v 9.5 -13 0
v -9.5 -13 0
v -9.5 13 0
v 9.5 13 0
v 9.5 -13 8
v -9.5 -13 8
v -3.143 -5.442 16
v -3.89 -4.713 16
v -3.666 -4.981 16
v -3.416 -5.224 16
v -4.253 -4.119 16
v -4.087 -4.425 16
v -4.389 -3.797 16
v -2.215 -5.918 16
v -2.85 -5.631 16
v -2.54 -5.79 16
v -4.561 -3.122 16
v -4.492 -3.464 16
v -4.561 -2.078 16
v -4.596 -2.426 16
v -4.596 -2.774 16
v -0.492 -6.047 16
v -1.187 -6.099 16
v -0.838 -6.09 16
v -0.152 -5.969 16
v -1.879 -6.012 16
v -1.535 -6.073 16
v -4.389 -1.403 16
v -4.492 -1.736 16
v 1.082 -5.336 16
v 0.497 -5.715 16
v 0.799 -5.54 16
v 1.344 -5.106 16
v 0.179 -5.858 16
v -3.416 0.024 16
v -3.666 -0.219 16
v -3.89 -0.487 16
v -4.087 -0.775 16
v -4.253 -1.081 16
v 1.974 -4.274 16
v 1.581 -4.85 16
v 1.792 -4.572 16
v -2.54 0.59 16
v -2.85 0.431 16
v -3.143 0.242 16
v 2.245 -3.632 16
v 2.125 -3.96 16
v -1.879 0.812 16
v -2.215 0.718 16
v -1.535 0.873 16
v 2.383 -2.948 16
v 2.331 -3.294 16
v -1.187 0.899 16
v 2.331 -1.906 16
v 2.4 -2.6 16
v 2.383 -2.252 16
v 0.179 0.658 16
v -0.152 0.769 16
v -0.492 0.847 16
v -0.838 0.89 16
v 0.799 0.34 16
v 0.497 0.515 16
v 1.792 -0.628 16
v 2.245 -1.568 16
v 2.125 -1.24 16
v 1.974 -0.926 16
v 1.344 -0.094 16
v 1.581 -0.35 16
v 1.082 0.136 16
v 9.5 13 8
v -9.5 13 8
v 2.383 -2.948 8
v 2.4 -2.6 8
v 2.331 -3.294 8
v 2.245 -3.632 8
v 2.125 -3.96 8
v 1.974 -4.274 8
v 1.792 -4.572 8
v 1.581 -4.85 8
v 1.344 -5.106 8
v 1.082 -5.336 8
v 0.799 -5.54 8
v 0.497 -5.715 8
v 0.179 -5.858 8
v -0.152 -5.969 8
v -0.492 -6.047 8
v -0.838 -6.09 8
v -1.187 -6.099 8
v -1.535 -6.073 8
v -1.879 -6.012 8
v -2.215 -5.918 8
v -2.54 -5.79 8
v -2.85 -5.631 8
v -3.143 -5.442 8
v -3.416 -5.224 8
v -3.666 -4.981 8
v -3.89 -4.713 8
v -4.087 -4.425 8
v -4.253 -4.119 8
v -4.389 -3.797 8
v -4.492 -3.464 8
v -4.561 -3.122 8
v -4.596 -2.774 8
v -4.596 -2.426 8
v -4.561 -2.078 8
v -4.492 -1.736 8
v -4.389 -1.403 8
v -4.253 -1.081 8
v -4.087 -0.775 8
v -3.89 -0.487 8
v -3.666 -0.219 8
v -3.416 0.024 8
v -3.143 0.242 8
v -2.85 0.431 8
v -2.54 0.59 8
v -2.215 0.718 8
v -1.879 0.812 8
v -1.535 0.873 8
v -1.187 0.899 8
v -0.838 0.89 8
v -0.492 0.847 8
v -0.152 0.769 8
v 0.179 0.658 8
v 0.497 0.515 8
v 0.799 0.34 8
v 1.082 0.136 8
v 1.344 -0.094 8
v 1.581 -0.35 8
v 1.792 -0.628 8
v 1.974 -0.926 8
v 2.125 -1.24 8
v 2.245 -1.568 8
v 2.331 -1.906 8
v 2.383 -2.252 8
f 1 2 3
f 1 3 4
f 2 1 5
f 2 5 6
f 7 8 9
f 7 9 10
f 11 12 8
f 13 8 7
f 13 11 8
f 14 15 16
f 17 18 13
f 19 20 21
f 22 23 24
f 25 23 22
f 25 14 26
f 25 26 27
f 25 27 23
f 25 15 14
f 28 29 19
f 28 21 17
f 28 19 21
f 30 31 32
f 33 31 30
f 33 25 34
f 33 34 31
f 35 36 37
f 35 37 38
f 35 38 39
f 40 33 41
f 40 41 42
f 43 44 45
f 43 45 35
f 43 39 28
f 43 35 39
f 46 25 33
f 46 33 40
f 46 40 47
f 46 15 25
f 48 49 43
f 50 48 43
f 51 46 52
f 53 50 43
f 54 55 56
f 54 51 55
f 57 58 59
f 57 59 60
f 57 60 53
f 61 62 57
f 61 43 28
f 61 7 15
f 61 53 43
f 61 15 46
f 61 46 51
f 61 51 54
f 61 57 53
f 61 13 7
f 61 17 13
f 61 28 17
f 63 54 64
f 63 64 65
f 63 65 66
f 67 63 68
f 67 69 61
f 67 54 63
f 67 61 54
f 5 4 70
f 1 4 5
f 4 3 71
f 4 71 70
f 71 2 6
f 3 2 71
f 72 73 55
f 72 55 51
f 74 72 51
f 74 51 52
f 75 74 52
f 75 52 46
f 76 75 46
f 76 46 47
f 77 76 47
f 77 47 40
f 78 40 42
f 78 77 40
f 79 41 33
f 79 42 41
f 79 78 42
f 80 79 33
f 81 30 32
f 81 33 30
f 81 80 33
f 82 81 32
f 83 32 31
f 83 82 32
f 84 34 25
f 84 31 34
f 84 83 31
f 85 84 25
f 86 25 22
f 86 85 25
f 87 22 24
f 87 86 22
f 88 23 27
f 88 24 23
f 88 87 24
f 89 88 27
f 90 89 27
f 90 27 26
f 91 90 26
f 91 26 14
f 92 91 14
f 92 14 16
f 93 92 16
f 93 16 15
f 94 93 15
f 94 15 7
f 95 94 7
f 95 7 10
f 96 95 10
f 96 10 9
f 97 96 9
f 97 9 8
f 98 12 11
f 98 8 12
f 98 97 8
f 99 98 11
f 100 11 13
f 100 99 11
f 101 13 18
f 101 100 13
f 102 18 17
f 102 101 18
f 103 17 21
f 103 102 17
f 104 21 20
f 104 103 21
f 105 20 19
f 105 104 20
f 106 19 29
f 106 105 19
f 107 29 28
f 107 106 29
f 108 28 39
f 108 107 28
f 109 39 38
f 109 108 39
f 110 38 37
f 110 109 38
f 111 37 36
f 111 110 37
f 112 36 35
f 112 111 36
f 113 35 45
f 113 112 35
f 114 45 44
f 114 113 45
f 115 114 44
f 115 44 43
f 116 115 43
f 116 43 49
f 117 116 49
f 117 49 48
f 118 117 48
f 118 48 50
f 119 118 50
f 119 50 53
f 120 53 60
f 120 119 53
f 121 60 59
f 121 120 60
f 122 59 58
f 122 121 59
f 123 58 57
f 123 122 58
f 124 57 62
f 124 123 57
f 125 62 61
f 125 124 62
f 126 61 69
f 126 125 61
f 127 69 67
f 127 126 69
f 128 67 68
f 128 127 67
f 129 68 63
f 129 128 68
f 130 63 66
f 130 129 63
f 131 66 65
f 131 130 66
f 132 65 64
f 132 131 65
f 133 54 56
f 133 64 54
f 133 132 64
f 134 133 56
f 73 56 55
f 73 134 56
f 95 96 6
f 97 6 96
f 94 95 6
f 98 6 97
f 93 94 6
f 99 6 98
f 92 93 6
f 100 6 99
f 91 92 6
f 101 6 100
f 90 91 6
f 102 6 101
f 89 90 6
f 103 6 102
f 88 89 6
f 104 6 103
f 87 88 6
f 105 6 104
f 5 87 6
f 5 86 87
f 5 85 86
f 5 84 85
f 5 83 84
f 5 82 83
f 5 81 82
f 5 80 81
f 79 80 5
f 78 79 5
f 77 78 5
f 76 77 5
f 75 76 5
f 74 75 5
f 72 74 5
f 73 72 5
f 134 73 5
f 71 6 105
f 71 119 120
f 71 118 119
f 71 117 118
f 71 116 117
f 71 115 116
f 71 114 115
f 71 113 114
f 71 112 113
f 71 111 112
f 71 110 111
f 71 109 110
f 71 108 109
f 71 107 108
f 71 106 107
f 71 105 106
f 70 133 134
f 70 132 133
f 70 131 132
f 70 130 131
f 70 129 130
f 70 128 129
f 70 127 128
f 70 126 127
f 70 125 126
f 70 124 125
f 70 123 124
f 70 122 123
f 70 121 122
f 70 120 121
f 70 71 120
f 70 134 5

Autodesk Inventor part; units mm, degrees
ref_plane "YZ Plane" through (0, 0, 0) normal (1, 0, 0) x (0, 1, 0)
ref_plane "XZ Plane" through (0, 0, 0) normal (0, 1, 0) x (-1, 0, 0)
ref_plane "XY Plane" through (0, 0, 0) normal (0, 0, 1) x (1, 0, 0)
sketch "Skizze1" plane through (0, 0, 0) normal (0, 0, 1) x (1, 0, 0)
  line L0 (-9.5, 13) -> (9.5, 13)
  line L1 (9.5, 13) -> (9.5, -13)
  line L2 (9.5, -13) -> (-9.5, -13)
  line L3 (-9.5, -13) -> (-9.5, 13)
  line L4 (-9.5, 13) -> (9.5, -13) construction
  line L5 (9.5, 13) -> (-9.5, -13) construction
  point P0 (0, 0)
  dimension "d0" = 19
  dimension "d1" = 26
extrude "Extrusion1" add sketch "Skizze1" along normal blind 8
sketch "Skizze2" plane through (0, 0, 8) normal (0, 0, 1) x (1, 0, 0)
  circle A0 centre (-1.1, -2.6) radius 3.5
  line L0 (-9.5, -13) -> (9.5, -13) projected
  line L1 (-9.5, 13) -> (-9.5, -13) projected
  point P0 (0, 0)
  dimension "d4" = 7
  dimension "d5" = 10.4
  dimension "d6" = 8.4
extrude "Extrusion2" add sketch "Skizze2" along normal blind 8
properties part number "encoder"
